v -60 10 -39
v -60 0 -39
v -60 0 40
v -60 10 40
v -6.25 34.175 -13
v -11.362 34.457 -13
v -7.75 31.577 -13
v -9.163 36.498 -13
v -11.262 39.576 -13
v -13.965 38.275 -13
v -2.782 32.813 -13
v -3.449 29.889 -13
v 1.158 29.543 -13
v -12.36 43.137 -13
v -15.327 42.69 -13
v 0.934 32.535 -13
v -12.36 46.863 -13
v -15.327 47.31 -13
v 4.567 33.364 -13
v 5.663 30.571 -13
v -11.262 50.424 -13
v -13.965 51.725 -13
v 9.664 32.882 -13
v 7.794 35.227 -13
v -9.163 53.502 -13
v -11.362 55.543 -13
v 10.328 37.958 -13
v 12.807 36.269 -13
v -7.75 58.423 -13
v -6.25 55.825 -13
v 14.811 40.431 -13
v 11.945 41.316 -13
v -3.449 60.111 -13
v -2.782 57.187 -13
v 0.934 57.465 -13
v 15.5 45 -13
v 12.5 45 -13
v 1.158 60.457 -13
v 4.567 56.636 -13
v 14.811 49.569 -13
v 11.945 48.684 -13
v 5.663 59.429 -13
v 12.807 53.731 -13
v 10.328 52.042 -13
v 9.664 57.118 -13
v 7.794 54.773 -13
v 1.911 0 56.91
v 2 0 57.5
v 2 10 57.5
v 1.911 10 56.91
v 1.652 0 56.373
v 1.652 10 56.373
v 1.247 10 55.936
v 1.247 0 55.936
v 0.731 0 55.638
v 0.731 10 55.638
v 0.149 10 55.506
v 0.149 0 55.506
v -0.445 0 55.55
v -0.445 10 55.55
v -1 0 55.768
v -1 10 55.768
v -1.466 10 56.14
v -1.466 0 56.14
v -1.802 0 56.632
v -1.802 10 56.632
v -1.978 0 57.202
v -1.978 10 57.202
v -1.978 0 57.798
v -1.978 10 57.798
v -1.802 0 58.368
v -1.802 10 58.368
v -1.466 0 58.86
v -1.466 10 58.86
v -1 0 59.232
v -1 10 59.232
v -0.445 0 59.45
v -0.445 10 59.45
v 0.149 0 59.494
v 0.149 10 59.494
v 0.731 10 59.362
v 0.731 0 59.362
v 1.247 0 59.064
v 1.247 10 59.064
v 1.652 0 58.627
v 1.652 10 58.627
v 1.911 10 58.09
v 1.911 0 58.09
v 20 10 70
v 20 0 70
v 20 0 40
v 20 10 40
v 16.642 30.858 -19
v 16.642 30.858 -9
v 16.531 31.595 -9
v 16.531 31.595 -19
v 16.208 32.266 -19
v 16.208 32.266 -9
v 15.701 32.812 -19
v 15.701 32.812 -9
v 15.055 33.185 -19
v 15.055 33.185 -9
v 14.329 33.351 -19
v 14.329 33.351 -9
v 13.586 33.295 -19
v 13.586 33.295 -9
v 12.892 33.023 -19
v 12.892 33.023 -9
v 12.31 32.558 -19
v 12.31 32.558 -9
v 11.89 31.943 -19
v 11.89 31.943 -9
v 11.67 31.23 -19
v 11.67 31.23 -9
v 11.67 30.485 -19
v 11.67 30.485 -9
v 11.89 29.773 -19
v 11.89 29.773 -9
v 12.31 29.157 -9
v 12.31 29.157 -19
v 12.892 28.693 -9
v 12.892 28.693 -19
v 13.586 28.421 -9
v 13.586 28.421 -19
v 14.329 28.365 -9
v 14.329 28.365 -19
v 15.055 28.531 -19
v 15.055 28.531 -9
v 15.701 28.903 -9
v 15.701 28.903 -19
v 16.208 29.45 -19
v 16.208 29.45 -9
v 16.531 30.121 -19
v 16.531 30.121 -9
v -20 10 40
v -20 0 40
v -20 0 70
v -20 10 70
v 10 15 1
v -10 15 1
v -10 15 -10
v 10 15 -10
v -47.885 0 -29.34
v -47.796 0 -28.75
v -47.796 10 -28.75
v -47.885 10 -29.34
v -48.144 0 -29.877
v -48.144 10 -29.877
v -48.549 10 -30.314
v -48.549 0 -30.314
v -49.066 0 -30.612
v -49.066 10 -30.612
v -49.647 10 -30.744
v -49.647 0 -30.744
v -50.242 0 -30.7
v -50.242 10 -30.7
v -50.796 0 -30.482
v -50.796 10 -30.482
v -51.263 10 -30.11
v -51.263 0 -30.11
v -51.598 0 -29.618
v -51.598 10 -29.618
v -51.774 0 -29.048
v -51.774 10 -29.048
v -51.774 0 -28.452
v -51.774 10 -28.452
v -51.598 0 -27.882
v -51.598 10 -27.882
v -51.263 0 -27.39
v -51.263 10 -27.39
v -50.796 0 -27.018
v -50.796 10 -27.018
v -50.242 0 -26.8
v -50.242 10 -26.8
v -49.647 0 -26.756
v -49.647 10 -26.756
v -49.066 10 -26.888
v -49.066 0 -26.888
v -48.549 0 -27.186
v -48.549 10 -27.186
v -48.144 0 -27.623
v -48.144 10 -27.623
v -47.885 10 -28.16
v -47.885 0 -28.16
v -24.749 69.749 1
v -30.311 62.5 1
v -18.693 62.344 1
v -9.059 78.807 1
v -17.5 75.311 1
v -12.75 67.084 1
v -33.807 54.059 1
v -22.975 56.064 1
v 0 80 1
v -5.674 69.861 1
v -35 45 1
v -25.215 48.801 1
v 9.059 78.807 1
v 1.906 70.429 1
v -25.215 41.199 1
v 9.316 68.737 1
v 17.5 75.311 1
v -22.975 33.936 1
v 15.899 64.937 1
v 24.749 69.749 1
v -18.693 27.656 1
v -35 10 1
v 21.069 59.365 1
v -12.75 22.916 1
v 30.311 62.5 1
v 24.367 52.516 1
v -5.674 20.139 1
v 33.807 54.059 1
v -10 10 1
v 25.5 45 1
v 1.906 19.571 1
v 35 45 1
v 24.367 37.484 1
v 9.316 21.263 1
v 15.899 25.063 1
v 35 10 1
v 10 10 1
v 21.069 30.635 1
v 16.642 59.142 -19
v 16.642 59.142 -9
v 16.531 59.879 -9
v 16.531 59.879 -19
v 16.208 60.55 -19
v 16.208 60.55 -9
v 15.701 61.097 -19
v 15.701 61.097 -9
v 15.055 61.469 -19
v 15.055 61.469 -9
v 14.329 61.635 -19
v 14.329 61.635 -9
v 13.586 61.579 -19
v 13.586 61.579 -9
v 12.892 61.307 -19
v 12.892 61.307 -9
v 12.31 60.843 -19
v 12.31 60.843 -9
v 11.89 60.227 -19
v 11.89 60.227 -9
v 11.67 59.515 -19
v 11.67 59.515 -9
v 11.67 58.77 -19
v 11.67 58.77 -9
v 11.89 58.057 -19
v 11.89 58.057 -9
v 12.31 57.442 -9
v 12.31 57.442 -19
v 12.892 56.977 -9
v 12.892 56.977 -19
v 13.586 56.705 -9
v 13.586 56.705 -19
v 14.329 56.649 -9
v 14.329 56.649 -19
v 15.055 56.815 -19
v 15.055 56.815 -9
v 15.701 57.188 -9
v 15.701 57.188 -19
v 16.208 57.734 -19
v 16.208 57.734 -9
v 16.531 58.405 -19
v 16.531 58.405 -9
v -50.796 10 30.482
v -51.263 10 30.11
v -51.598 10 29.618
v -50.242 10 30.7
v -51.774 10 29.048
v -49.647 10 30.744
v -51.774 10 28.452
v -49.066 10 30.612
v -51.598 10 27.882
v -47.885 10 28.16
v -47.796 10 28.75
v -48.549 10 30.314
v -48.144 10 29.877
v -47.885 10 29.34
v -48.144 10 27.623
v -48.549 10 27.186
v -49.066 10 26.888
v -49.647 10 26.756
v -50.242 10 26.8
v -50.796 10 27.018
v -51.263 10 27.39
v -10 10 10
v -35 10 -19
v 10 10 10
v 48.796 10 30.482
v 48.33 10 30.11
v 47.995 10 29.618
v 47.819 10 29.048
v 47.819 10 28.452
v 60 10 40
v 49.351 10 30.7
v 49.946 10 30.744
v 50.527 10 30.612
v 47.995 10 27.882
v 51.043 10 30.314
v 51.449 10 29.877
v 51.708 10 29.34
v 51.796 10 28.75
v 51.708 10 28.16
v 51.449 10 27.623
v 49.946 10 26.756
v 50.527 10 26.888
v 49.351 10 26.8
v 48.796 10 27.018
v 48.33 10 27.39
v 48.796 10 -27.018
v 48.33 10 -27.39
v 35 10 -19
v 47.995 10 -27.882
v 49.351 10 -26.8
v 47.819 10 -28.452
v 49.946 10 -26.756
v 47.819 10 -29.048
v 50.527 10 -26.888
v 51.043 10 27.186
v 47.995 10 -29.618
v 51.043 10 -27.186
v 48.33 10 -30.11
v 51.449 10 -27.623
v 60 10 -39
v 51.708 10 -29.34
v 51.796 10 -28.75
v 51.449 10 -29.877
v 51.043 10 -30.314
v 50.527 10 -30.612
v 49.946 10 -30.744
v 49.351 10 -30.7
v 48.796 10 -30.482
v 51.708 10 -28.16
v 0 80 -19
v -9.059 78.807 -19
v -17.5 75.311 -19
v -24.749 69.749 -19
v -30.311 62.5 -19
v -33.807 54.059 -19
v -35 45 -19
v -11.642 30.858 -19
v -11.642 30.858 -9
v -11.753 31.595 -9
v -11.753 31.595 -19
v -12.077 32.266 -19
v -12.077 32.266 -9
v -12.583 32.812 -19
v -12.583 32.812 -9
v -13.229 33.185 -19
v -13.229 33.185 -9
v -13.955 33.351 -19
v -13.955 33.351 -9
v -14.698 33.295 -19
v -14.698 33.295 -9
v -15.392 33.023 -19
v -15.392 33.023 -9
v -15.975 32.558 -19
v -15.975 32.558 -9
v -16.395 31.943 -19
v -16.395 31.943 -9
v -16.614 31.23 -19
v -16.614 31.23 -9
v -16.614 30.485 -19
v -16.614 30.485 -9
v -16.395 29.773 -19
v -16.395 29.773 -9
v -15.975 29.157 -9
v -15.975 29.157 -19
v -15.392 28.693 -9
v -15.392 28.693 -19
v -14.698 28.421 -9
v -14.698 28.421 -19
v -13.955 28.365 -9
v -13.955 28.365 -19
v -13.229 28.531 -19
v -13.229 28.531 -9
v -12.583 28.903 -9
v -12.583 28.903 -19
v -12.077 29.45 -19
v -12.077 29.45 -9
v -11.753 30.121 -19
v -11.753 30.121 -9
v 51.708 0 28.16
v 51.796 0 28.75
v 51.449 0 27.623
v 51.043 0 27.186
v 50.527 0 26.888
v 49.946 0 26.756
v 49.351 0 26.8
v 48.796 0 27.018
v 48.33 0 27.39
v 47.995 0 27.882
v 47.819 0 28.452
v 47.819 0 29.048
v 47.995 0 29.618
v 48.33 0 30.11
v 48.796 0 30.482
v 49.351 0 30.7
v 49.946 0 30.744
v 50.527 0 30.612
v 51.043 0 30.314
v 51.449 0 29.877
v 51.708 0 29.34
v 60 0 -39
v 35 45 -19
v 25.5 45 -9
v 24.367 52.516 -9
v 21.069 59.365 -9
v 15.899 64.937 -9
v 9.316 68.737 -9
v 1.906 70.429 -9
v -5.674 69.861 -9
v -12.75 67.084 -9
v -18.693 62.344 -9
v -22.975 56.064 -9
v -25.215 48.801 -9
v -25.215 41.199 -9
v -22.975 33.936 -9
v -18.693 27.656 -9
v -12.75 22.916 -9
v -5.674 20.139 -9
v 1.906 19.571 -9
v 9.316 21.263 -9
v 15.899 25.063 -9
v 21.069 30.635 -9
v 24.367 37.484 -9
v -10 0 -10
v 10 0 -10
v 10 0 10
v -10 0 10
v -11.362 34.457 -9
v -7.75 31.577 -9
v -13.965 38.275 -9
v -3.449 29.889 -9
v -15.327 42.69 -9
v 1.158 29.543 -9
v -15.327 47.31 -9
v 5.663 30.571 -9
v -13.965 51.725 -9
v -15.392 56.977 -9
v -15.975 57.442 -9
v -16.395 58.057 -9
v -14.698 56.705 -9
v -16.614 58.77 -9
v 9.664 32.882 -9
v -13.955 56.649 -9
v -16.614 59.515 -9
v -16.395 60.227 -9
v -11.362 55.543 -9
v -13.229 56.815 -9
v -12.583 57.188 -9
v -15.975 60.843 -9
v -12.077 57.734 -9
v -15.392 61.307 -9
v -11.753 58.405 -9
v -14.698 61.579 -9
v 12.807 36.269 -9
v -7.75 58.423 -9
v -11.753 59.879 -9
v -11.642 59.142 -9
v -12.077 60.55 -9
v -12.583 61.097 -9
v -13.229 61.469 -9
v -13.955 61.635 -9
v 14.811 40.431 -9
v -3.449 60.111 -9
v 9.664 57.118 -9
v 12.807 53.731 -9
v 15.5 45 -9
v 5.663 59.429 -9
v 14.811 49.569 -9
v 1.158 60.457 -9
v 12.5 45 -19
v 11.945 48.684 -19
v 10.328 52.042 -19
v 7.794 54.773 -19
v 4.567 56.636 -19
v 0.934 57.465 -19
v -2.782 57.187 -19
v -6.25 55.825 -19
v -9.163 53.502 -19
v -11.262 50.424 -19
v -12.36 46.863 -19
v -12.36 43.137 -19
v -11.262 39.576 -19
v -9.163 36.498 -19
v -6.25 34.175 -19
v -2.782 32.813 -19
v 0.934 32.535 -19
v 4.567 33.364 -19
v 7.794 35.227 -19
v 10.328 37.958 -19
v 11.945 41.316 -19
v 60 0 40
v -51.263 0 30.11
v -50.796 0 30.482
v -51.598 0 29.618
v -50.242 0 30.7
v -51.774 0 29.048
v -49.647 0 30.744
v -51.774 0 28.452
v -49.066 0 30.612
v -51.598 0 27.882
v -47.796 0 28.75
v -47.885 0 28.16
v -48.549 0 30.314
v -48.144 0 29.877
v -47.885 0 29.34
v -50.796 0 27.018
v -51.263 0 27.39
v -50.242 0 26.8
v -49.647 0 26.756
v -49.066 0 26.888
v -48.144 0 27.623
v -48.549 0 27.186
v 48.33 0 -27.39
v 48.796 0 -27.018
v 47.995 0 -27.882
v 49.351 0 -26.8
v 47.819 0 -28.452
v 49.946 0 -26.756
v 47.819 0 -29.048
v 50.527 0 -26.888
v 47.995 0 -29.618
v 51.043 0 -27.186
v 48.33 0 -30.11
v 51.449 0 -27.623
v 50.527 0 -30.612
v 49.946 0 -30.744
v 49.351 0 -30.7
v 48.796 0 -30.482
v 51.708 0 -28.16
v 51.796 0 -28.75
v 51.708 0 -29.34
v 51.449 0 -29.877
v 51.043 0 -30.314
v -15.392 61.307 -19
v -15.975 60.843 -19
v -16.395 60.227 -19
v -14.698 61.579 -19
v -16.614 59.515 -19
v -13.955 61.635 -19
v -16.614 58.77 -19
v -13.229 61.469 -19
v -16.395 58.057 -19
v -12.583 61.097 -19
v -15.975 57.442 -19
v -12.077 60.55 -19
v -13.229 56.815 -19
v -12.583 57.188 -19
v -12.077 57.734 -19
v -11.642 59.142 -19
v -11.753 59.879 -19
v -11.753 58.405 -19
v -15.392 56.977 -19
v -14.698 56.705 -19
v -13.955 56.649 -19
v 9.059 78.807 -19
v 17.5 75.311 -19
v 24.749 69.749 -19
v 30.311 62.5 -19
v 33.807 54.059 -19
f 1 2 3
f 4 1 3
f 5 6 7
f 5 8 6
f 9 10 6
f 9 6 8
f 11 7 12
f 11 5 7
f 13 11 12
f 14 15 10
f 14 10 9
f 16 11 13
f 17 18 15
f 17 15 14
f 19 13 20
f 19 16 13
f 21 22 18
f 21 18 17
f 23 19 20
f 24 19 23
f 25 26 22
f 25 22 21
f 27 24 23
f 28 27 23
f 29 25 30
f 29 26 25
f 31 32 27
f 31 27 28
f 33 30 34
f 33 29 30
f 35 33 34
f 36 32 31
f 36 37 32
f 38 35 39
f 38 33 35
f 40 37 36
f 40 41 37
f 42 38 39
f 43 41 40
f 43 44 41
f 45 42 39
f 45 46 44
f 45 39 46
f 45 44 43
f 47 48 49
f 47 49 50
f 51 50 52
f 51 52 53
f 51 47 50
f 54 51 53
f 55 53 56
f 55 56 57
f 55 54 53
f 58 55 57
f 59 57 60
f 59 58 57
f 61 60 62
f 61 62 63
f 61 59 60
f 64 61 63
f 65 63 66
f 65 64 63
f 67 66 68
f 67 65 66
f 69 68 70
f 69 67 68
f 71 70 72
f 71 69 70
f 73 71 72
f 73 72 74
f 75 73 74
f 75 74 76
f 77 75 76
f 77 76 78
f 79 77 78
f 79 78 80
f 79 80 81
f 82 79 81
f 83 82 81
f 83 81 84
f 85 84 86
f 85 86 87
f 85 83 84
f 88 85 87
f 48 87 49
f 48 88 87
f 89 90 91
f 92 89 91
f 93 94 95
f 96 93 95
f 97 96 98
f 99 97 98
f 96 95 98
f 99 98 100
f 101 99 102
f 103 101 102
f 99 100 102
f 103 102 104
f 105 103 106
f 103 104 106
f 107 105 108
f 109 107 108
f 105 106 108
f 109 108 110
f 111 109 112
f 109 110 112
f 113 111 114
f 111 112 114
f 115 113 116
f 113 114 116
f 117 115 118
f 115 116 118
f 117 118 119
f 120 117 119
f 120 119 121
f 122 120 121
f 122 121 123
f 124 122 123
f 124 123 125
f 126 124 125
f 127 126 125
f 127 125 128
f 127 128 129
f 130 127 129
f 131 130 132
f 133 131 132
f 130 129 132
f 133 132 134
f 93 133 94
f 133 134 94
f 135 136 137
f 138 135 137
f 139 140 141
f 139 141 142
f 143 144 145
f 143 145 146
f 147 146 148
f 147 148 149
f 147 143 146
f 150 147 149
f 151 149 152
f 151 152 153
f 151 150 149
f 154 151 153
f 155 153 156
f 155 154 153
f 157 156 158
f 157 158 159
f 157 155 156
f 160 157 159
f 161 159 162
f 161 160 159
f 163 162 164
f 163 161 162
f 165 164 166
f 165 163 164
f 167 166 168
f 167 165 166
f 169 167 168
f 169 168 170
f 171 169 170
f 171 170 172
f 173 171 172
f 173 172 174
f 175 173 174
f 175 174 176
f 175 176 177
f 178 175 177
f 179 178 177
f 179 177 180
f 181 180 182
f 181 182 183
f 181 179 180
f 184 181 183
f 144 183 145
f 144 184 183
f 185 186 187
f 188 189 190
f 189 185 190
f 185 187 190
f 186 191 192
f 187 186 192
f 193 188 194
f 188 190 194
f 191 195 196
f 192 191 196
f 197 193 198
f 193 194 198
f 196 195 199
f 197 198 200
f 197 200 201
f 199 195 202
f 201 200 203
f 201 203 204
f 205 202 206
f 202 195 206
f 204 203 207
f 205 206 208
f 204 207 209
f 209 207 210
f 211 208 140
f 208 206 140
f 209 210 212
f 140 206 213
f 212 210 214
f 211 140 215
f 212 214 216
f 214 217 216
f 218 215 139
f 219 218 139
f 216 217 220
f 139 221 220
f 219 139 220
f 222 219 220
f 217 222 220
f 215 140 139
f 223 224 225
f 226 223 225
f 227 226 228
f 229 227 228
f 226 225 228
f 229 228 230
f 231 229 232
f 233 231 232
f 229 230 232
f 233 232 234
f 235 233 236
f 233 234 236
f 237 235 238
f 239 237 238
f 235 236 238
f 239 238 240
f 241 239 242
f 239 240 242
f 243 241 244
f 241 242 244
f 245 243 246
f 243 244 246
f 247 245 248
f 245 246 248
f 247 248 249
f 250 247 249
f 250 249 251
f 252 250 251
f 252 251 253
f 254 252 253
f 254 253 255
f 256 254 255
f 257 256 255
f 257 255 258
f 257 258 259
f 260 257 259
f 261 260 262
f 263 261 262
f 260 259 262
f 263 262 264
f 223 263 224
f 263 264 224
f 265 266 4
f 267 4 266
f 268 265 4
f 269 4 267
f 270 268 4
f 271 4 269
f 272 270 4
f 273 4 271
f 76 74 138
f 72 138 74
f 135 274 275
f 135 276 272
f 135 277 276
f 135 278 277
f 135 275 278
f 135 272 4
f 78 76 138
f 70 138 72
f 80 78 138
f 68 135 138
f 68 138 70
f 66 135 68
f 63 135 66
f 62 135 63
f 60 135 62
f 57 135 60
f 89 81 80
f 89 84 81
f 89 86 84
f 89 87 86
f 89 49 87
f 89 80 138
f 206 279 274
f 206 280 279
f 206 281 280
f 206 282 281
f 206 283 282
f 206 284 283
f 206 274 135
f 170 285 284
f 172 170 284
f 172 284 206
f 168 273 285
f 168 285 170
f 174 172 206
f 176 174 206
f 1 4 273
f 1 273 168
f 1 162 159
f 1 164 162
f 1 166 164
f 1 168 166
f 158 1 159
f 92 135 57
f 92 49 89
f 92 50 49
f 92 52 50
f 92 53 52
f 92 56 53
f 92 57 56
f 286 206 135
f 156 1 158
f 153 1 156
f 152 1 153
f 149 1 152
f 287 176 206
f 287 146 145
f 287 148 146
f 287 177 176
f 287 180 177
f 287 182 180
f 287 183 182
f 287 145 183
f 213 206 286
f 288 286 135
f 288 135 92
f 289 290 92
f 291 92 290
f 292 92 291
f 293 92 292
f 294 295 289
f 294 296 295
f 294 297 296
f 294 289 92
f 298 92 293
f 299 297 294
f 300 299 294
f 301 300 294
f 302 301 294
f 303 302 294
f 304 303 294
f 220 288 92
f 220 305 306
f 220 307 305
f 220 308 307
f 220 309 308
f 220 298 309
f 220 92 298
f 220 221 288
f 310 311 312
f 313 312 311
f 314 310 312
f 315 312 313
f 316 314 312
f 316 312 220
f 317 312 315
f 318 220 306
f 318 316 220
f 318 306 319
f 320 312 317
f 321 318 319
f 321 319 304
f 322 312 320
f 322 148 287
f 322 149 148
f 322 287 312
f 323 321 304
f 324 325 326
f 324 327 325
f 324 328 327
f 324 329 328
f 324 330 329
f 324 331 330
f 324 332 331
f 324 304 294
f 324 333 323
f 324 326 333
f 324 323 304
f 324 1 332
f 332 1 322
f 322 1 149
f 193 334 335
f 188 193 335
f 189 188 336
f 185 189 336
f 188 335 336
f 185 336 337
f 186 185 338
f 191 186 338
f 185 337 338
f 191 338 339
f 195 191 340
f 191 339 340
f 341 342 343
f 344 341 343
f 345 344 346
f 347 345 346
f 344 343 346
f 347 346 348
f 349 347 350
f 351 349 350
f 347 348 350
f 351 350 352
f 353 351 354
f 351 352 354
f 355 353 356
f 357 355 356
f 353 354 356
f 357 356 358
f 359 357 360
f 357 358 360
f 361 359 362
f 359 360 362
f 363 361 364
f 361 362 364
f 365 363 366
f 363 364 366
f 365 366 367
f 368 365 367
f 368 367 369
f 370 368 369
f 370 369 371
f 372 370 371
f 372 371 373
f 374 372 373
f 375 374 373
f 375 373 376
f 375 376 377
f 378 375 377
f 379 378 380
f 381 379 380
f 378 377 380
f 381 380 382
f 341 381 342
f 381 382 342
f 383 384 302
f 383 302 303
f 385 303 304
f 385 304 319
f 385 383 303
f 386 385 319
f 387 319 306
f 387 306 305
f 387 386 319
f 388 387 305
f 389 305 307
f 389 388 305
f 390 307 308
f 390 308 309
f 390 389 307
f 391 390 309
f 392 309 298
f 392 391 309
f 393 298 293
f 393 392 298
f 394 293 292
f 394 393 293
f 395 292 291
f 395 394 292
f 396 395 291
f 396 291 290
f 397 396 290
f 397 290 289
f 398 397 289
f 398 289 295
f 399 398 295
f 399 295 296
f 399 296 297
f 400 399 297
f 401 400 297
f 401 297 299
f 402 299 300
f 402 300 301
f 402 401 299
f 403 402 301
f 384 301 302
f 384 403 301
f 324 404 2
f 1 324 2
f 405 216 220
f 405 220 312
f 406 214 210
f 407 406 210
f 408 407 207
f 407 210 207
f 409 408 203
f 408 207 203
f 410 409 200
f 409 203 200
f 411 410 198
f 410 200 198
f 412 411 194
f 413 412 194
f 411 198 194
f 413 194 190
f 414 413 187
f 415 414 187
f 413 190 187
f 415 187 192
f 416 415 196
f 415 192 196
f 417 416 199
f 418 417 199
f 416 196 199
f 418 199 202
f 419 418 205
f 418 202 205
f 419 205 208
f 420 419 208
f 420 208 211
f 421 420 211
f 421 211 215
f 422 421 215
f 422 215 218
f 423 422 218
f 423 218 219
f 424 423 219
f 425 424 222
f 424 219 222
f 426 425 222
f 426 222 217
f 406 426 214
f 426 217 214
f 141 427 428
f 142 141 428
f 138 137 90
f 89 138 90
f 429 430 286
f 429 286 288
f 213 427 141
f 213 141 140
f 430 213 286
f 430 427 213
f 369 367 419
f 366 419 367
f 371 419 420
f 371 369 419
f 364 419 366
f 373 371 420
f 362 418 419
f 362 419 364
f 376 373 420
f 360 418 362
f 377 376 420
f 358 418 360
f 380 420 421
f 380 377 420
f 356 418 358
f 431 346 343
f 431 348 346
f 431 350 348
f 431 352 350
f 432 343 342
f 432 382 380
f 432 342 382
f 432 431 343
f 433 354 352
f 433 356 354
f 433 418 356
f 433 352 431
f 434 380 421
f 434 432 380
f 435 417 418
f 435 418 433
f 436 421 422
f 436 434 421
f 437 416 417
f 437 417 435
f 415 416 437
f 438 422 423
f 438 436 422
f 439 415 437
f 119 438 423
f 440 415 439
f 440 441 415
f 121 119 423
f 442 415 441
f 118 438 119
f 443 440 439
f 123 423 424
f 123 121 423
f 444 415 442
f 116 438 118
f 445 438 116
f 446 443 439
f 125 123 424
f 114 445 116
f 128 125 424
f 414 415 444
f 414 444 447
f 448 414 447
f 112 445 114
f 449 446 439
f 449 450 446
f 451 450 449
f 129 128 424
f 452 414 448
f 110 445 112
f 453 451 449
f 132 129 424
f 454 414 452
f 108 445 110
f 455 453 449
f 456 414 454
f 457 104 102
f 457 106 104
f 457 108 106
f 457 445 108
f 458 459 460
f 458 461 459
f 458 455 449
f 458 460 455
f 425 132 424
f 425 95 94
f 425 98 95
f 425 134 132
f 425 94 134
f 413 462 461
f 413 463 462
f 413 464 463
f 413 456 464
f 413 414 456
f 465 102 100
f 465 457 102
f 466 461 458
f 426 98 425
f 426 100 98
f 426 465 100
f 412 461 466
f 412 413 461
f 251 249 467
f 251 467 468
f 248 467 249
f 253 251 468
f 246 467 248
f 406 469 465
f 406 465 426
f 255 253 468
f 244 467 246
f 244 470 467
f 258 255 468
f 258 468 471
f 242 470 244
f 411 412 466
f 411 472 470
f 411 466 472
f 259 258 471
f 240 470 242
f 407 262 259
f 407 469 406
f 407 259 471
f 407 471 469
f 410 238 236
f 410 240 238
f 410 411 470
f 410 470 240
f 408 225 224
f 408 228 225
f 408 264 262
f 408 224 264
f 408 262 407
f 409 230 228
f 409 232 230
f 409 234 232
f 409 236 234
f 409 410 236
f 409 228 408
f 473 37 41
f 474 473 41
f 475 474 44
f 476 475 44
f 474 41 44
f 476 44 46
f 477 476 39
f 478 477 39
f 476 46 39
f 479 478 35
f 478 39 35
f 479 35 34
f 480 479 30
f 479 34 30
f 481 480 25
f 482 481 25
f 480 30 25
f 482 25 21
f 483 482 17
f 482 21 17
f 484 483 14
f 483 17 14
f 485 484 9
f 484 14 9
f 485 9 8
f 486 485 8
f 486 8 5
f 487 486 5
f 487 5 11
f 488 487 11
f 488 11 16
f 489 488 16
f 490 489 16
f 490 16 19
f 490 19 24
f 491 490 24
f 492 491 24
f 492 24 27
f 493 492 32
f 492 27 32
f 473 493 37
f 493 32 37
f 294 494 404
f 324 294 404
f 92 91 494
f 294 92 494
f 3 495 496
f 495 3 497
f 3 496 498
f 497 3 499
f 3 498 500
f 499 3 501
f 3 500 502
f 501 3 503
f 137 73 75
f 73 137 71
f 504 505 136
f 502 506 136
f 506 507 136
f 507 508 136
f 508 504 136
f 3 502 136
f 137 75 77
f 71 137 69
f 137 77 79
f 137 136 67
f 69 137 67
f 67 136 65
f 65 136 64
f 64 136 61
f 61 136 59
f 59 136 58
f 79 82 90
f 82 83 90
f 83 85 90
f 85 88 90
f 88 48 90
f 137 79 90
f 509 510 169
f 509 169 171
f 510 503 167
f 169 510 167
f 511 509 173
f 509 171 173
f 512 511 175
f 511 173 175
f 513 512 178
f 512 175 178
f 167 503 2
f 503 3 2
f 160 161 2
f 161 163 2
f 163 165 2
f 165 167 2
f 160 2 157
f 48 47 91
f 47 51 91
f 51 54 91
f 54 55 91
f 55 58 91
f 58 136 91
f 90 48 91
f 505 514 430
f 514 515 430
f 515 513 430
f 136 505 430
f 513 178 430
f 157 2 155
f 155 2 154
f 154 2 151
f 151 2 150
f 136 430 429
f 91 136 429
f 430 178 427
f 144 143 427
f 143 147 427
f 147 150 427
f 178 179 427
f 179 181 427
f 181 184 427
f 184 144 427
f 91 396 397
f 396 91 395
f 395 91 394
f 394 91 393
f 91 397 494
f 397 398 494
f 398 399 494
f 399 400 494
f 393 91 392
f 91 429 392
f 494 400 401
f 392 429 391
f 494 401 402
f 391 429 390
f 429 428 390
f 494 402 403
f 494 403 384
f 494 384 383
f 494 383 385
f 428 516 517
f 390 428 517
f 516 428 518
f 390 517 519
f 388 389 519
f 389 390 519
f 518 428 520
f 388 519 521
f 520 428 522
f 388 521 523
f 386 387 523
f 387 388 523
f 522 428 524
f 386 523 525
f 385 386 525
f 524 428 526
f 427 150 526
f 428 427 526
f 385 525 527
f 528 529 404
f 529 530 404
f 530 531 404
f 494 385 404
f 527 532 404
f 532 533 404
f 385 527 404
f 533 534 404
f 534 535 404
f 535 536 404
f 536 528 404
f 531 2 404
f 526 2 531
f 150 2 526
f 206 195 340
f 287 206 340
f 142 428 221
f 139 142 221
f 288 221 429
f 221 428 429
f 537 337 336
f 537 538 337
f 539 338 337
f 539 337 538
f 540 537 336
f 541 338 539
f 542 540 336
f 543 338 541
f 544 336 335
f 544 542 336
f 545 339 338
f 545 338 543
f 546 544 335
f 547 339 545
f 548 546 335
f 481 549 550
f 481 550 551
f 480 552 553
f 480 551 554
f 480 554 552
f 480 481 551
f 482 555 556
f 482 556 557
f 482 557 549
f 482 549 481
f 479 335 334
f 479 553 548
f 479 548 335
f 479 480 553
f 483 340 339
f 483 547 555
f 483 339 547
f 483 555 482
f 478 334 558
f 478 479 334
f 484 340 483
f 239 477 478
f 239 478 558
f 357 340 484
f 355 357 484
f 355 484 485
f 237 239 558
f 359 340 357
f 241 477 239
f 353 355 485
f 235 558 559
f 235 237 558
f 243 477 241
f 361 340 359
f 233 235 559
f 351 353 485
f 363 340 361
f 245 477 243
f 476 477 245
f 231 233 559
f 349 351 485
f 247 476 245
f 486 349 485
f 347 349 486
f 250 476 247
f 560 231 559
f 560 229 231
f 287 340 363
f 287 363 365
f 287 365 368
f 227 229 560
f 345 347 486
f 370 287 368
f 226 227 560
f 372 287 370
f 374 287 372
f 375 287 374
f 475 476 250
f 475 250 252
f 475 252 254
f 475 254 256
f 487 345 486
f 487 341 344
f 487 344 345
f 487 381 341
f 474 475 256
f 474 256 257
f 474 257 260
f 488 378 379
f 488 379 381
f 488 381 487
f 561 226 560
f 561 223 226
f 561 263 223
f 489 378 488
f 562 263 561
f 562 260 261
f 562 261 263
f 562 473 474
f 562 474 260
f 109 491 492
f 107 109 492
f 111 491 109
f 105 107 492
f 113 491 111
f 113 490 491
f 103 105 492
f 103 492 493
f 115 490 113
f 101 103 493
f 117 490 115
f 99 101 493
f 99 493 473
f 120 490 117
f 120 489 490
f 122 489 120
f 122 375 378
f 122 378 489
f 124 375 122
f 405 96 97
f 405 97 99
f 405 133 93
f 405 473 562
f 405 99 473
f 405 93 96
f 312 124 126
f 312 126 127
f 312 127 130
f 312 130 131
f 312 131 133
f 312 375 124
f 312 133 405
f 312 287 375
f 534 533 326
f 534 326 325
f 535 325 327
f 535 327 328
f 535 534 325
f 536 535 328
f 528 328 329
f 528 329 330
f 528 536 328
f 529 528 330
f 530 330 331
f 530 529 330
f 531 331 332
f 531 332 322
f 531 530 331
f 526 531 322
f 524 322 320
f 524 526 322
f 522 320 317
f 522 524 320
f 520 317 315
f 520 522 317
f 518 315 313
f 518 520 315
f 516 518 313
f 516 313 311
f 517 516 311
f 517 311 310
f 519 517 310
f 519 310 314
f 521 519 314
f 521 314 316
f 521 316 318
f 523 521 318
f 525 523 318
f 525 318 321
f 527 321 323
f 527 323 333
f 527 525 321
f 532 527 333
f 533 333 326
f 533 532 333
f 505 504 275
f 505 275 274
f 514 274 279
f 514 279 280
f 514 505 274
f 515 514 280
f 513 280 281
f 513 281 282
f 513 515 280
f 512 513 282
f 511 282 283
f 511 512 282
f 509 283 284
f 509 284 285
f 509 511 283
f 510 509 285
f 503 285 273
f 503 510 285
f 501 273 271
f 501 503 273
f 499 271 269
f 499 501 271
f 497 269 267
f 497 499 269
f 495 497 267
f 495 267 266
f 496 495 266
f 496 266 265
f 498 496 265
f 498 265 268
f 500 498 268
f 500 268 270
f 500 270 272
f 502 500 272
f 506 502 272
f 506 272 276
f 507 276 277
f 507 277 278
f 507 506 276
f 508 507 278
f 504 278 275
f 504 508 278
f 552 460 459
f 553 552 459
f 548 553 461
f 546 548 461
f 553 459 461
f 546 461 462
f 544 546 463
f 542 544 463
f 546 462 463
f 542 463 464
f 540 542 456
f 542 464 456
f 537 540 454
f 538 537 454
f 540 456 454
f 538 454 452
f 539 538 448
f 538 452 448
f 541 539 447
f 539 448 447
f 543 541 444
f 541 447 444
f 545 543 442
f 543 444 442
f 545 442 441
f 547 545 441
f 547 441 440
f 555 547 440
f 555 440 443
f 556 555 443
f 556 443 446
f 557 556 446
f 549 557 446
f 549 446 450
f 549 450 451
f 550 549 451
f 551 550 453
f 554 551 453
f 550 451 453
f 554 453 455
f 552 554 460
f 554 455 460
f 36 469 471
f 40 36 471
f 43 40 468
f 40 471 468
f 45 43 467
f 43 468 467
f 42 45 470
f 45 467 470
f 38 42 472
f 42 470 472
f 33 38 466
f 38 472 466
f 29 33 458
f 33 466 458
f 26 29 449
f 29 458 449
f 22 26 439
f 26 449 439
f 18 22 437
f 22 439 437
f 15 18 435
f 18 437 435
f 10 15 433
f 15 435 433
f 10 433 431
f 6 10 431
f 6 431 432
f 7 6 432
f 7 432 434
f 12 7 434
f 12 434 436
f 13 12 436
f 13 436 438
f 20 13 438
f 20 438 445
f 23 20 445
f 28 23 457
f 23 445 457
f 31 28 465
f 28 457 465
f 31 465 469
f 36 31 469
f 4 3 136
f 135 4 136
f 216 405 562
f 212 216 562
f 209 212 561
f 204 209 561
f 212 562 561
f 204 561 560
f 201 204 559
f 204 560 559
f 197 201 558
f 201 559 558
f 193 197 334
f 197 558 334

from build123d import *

# Parameters (mm, degrees)
SKETCH1_R           = 2
BOSS_EXTRUDE1_DEPTH = 10
SKETCH2_W           = 70
SKETCH2_H           = 20
BOSS_EXTRUDE2_DEPTH = 70
CUT_EXTRUDE1_DEPTH  = 20
SKETCH4_R           = 25.5
CUT_EXTRUDE2_DEPTH  = 10
SKETCH5_R           = 15.5
CUT_EXTRUDE3_DEPTH  = 4
SKETCH6_R           = 2.5
CUT_EXTRUDE4_DEPTH  = 10
SKETCH7_R           = 12.5
CUT_EXTRUDE5_DEPTH  = 6
SKETCH8_W           = 20
SKETCH8_H           = 20
CUT_EXTRUDE6_DEPTH  = 15


with BuildPart() as part:
    # Sketch1 → Boss-Extrude1 (new body)
    with BuildSketch(Plane(origin=(0, 0, 0), x_dir=(1, 0, 0), z_dir=(0, 1, 0))):
        Polygon((-35, -40), (-20, -40), (-20, -70), (20, -70), (20, -40), (35, -40), (60, -40), (60, 39), (-60, 39), (-60, -40), align=None)
        with Locations((49.796460718, 28.75)):
            Circle(SKETCH1_R, mode=Mode.SUBTRACT)
        with Locations((49.796460718, -28.75)):
            Circle(SKETCH1_R, mode=Mode.SUBTRACT)
        with Locations((0, -57.5)):
            Circle(SKETCH1_R, mode=Mode.SUBTRACT)
        with Locations((-49.796460718, -28.75)):
            Circle(SKETCH1_R, mode=Mode.SUBTRACT)
        with Locations((-49.796460718, 28.75)):
            Circle(SKETCH1_R, mode=Mode.SUBTRACT)
    extrude(amount=BOSS_EXTRUDE1_DEPTH)

    # Sketch2 → Boss-Extrude2 (add)
    with BuildSketch(Plane(origin=(0, 10, 0), x_dir=(1, 0, 0), z_dir=(0, 1, 0))):
        with Locations((0, 9)):
            Rectangle(SKETCH2_W, SKETCH2_H)
    extrude(amount=BOSS_EXTRUDE2_DEPTH)

    # Sketch3 → Cut-Extrude1 (cut)
    with BuildSketch(Plane(origin=(0, 0, -19), x_dir=(-1, 0, 0), z_dir=(0, 0, -1))):
        with BuildLine():
            ThreePointArc((-35, 45), (-24.748737331, 69.748737352), (3e-08, 80))
            Line((3e-08, 80), (-35, 80))
            Line((-35, 80), (-35, 45))
        make_face()
        with BuildLine():
            Line((35, 45), (35, 80))
            Line((35, 80), (3e-08, 80))
            ThreePointArc((3e-08, 80), (24.748737352, 69.748737331), (35, 45))
        make_face()
    extrude(amount=-CUT_EXTRUDE1_DEPTH, mode=Mode.SUBTRACT)

    # Sketch4 → Cut-Extrude2 (cut)
    with BuildSketch(Plane.XY.offset(1)):
        with Locations((0, 45)):
            Circle(SKETCH4_R)
    extrude(amount=-CUT_EXTRUDE2_DEPTH, mode=Mode.SUBTRACT)

    # Sketch5 → Cut-Extrude3 (cut)
    with BuildSketch(Plane.XY.offset(-9)):
        with Locations((0, 45)):
            Circle(SKETCH5_R)
    extrude(amount=-CUT_EXTRUDE3_DEPTH, mode=Mode.SUBTRACT)

    # Sketch6 → Cut-Extrude4 (cut)
    with BuildSketch(Plane.XY.offset(-9)):
        with Locations((14.142135624, 59.142135624)):
            Circle(SKETCH6_R)
        with Locations((14.142135624, 30.857864376)):
            Circle(SKETCH6_R)
        with Locations((-14.142135624, 30.857864376)):
            Circle(SKETCH6_R)
        with Locations((-14.142135624, 59.142135624)):
            Circle(SKETCH6_R)
    extrude(amount=-CUT_EXTRUDE4_DEPTH, mode=Mode.SUBTRACT)

    # Sketch7 → Cut-Extrude5 (cut)
    with BuildSketch(Plane.XY.offset(-13)):
        with Locations((0, 45)):
            Circle(SKETCH7_R)
    extrude(amount=-CUT_EXTRUDE5_DEPTH, mode=Mode.SUBTRACT)

    # Sketch8 → Cut-Extrude6 (cut)
    with BuildSketch(Plane.XZ):
        Rectangle(SKETCH8_W, SKETCH8_H)
    extrude(amount=-CUT_EXTRUDE6_DEPTH, mode=Mode.SUBTRACT)


solid = part.part
